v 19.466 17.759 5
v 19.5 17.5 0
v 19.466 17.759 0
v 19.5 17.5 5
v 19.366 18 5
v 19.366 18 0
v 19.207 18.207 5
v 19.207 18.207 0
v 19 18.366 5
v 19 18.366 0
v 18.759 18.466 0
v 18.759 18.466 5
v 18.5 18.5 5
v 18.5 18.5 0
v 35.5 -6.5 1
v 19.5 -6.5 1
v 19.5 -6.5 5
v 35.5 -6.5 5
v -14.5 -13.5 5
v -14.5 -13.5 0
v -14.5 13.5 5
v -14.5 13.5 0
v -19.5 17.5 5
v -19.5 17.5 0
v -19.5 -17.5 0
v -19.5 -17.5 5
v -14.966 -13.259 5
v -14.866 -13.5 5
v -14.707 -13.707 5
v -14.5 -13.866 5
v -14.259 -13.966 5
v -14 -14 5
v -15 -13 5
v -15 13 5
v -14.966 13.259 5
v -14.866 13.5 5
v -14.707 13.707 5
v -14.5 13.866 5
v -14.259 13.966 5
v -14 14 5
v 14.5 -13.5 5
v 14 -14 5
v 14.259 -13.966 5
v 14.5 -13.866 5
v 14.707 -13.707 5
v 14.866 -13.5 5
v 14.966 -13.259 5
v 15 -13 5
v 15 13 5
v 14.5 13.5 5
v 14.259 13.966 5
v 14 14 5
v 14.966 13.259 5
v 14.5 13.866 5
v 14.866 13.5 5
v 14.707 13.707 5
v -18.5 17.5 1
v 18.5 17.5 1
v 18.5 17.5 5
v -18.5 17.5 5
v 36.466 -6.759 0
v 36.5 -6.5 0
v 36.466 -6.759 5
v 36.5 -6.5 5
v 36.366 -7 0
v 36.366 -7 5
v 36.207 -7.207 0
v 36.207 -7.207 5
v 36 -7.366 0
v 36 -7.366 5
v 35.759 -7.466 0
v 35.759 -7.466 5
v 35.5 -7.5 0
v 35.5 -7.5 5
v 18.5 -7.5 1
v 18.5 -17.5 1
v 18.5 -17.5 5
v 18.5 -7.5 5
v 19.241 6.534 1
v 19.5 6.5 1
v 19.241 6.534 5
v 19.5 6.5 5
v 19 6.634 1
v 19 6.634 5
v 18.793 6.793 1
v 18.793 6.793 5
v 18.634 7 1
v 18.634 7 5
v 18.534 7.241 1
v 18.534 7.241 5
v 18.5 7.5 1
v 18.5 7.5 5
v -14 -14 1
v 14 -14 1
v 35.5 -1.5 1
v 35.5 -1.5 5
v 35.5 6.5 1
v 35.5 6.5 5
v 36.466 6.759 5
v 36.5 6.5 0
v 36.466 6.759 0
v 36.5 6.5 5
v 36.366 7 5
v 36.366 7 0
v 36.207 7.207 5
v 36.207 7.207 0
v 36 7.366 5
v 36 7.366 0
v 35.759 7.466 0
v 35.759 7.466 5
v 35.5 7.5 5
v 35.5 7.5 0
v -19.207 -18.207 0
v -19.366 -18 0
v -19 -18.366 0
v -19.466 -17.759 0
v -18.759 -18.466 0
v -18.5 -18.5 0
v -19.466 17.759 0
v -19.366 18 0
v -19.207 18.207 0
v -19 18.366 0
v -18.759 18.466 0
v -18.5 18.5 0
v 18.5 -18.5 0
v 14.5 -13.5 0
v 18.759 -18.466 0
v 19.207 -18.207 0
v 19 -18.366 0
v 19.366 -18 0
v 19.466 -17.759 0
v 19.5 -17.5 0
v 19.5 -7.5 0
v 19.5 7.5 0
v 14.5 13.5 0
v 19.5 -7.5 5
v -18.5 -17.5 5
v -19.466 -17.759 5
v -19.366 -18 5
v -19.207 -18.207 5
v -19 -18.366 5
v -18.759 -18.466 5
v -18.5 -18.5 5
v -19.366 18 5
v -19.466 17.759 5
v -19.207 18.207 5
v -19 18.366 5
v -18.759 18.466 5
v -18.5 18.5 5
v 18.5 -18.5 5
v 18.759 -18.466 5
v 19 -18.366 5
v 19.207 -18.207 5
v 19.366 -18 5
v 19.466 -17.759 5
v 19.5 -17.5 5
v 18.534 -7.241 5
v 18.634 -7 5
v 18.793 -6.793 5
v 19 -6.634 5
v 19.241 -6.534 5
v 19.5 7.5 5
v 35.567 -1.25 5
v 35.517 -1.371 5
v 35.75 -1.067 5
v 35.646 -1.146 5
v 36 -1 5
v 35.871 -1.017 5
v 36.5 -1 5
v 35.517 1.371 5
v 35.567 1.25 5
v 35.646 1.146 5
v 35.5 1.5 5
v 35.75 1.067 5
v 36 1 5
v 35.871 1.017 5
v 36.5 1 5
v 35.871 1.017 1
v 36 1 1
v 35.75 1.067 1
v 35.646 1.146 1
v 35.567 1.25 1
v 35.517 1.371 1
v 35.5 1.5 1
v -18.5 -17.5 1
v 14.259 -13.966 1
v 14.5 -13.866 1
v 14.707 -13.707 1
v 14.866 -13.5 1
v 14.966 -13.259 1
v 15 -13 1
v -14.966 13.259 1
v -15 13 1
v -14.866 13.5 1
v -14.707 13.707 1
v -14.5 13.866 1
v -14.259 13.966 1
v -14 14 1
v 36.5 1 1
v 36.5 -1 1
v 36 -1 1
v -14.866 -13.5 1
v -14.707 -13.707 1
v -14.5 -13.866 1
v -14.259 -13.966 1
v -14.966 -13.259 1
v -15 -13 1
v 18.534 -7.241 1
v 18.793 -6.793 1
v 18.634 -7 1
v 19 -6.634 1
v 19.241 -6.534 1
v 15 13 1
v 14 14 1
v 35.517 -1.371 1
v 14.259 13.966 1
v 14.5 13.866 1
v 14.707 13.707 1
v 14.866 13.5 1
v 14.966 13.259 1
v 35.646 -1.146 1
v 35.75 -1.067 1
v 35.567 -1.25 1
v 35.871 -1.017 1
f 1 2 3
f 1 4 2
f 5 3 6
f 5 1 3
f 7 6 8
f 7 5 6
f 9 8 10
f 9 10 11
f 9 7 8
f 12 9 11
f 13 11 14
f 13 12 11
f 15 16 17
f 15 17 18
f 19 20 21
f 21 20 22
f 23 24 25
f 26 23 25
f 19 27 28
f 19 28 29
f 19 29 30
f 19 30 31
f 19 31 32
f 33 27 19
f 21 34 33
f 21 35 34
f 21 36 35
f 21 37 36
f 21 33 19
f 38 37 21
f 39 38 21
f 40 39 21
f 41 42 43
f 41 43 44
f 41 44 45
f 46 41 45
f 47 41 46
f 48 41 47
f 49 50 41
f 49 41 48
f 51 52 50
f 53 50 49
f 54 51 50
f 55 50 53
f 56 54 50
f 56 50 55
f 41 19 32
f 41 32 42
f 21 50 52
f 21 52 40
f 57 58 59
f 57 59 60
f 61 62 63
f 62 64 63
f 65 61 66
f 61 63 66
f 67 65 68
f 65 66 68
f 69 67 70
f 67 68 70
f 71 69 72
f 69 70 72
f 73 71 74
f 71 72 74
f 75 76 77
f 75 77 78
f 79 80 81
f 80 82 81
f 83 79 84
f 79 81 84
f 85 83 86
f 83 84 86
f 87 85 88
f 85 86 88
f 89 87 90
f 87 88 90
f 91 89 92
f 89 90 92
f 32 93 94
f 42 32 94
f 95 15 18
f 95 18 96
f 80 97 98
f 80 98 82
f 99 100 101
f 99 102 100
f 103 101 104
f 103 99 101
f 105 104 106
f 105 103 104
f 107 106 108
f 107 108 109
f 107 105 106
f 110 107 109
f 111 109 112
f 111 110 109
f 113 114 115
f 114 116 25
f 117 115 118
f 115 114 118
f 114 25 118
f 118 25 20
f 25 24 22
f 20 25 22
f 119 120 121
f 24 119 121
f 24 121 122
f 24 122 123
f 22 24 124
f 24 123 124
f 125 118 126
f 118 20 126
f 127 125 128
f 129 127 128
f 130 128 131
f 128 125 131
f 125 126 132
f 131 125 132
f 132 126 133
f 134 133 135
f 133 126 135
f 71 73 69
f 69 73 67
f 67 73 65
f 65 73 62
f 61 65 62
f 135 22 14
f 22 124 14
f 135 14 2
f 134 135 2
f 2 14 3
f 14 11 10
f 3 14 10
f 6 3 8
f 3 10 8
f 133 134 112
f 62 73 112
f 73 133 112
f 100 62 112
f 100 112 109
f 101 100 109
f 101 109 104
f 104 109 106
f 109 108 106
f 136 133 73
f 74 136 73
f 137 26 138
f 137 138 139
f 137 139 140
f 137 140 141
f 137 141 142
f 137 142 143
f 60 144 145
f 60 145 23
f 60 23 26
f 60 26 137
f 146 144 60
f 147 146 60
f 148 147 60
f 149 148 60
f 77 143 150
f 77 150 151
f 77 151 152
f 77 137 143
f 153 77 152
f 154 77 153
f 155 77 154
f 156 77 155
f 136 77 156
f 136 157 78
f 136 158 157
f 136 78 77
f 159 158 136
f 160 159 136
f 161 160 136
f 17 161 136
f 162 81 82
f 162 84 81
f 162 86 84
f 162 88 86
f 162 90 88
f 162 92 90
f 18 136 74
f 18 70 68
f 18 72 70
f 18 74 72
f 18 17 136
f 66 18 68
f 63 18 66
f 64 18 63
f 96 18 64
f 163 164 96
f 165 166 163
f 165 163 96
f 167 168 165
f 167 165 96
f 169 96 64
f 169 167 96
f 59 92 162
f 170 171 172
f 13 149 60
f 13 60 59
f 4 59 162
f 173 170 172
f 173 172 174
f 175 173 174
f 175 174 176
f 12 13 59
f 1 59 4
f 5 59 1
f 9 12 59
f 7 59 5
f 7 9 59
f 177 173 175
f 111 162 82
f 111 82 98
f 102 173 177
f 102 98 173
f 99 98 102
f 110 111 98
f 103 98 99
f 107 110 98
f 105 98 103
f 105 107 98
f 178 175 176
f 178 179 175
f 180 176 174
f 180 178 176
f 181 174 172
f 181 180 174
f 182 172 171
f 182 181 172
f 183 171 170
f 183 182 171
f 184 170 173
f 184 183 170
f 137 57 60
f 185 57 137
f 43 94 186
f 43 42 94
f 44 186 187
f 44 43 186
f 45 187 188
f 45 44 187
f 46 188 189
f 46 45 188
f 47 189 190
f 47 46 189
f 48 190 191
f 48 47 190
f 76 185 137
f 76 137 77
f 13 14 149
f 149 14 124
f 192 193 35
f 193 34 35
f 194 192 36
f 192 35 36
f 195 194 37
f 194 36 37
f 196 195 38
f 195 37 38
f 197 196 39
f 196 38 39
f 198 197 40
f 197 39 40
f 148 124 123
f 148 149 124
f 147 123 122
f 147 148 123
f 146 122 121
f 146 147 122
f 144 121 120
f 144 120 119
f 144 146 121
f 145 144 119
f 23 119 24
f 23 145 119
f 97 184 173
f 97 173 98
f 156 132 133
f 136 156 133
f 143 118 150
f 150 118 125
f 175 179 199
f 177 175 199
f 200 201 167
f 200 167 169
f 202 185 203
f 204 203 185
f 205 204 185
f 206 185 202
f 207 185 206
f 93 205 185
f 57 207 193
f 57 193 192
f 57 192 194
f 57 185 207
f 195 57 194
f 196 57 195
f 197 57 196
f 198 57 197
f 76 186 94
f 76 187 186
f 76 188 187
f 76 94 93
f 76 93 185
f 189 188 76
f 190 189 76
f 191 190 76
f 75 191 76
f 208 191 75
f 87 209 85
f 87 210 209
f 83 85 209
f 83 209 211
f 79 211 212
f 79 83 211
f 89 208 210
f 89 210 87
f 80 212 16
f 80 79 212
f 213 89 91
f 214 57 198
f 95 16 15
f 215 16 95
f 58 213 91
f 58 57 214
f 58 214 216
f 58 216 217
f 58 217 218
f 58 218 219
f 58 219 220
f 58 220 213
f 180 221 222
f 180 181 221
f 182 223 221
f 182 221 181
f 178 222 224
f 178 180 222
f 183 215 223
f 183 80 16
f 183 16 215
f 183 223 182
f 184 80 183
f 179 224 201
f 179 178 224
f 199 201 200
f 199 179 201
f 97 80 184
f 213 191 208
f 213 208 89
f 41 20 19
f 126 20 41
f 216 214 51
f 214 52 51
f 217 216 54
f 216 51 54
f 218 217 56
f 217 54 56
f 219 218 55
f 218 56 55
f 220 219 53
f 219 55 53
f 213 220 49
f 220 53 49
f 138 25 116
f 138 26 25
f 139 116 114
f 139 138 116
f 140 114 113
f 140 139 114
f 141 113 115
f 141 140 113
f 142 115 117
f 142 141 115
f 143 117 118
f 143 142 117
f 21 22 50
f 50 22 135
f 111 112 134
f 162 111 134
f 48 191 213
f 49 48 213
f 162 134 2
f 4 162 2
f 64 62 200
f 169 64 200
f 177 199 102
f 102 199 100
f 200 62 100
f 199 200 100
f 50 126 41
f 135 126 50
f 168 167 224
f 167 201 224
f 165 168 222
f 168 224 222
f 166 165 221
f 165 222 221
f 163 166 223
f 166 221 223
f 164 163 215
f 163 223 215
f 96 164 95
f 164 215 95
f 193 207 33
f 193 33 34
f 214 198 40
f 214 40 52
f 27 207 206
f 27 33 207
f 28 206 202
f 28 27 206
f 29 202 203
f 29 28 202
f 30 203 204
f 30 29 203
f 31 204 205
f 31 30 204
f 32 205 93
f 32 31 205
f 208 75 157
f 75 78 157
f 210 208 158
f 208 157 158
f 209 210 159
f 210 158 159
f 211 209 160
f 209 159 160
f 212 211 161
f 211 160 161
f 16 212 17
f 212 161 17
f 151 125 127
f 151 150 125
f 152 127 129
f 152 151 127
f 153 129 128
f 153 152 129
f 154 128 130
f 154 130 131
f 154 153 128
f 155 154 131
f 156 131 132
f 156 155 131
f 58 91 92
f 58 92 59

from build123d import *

# Parameters (mm, degrees)
PAD_DEPTH       = 5
POCKET_DEPTH    = 4
SKETCH001_W     = 30
SKETCH001_H     = 28
PAD001_DEPTH    = 5
SKETCH003_W     = 29
SKETCH003_H     = 27
POCKET001_DEPTH = 5
SKETCH004_W     = 2
SKETCH004_H     = 2
POCKET002_DEPTH = 4
FILLET_R        = 1
FILLET001_R     = 1
FILLET002_R     = 1
FILLET003_R     = 0.5


with BuildPart() as part:
    # Sketch → Pad (new body)
    with BuildSketch(Plane.XY):
        Polygon((36.5, 7.5), (19.5, 7.5), (19.5, 18.5), (-19.5, 18.5), (-19.5, -18.5), (19.5, -18.5), (19.5, -7.5), (36.5, -7.5), align=None)
    extrude(amount=PAD_DEPTH)

    # Sketch002 → Pocket (cut)
    with BuildSketch(Plane.XY.offset(1)):
        Polygon((35.5, 6.5), (18.5, 6.5), (18.5, 17.5), (-18.5, 17.5), (-18.5, -17.5), (18.5, -17.5), (18.5, -6.5), (35.5, -6.5), align=None)
    extrude(amount=POCKET_DEPTH, mode=Mode.SUBTRACT)

    # Sketch001 → Pad001 (join)
    with BuildSketch(Plane.XY):
        Rectangle(SKETCH001_W, SKETCH001_H)
    extrude(amount=PAD001_DEPTH)

    # Sketch003 → Pocket001 (cut)
    with BuildSketch(Plane.XY):
        Rectangle(SKETCH003_W, SKETCH003_H)
    extrude(amount=POCKET001_DEPTH, mode=Mode.SUBTRACT)

    # Sketch004 → Pocket002 (cut)
    with BuildSketch(Plane.XY.offset(1)):
        with Locations((35.5, 0)):
            Rectangle(SKETCH004_W, SKETCH004_H)
    extrude(amount=POCKET002_DEPTH, mode=Mode.SUBTRACT)

    # Fillet
    fillet_edges = [part.edges().sort_by_distance(p)[0] for p in [
        (-15, -14, 3),
        (15, -14, 3),
        (15, 14, 3),
        (-15, 14, 3),
    ]]
    fillet(fillet_edges, radius=FILLET_R)

    # Fillet001
    fillet001_edges = [part.edges().sort_by_distance(p)[0] for p in [
        (18.5, 6.5, 3),
        (18.5, -6.5, 3),
    ]]
    fillet(fillet001_edges, radius=FILLET001_R)

    # Fillet002
    fillet002_edges = [part.edges().sort_by_distance(p)[0] for p in [
        (-19.5, 18.5, 2.5),
        (-19.5, -18.5, 2.5),
        (19.5, 18.5, 2.5),
        (36.5, 7.5, 2.5),
        (36.5, -7.5, 2.5),
        (19.5, -18.5, 2.5),
    ]]
    fillet(fillet002_edges, radius=FILLET002_R)

    # Fillet003
    fillet003_edges = [part.edges().sort_by_distance(p)[0] for p in [
        (35.5, -1, 3),
        (35.5, 1, 3),
    ]]
    fillet(fillet003_edges, radius=FILLET003_R)


solid = part.part
